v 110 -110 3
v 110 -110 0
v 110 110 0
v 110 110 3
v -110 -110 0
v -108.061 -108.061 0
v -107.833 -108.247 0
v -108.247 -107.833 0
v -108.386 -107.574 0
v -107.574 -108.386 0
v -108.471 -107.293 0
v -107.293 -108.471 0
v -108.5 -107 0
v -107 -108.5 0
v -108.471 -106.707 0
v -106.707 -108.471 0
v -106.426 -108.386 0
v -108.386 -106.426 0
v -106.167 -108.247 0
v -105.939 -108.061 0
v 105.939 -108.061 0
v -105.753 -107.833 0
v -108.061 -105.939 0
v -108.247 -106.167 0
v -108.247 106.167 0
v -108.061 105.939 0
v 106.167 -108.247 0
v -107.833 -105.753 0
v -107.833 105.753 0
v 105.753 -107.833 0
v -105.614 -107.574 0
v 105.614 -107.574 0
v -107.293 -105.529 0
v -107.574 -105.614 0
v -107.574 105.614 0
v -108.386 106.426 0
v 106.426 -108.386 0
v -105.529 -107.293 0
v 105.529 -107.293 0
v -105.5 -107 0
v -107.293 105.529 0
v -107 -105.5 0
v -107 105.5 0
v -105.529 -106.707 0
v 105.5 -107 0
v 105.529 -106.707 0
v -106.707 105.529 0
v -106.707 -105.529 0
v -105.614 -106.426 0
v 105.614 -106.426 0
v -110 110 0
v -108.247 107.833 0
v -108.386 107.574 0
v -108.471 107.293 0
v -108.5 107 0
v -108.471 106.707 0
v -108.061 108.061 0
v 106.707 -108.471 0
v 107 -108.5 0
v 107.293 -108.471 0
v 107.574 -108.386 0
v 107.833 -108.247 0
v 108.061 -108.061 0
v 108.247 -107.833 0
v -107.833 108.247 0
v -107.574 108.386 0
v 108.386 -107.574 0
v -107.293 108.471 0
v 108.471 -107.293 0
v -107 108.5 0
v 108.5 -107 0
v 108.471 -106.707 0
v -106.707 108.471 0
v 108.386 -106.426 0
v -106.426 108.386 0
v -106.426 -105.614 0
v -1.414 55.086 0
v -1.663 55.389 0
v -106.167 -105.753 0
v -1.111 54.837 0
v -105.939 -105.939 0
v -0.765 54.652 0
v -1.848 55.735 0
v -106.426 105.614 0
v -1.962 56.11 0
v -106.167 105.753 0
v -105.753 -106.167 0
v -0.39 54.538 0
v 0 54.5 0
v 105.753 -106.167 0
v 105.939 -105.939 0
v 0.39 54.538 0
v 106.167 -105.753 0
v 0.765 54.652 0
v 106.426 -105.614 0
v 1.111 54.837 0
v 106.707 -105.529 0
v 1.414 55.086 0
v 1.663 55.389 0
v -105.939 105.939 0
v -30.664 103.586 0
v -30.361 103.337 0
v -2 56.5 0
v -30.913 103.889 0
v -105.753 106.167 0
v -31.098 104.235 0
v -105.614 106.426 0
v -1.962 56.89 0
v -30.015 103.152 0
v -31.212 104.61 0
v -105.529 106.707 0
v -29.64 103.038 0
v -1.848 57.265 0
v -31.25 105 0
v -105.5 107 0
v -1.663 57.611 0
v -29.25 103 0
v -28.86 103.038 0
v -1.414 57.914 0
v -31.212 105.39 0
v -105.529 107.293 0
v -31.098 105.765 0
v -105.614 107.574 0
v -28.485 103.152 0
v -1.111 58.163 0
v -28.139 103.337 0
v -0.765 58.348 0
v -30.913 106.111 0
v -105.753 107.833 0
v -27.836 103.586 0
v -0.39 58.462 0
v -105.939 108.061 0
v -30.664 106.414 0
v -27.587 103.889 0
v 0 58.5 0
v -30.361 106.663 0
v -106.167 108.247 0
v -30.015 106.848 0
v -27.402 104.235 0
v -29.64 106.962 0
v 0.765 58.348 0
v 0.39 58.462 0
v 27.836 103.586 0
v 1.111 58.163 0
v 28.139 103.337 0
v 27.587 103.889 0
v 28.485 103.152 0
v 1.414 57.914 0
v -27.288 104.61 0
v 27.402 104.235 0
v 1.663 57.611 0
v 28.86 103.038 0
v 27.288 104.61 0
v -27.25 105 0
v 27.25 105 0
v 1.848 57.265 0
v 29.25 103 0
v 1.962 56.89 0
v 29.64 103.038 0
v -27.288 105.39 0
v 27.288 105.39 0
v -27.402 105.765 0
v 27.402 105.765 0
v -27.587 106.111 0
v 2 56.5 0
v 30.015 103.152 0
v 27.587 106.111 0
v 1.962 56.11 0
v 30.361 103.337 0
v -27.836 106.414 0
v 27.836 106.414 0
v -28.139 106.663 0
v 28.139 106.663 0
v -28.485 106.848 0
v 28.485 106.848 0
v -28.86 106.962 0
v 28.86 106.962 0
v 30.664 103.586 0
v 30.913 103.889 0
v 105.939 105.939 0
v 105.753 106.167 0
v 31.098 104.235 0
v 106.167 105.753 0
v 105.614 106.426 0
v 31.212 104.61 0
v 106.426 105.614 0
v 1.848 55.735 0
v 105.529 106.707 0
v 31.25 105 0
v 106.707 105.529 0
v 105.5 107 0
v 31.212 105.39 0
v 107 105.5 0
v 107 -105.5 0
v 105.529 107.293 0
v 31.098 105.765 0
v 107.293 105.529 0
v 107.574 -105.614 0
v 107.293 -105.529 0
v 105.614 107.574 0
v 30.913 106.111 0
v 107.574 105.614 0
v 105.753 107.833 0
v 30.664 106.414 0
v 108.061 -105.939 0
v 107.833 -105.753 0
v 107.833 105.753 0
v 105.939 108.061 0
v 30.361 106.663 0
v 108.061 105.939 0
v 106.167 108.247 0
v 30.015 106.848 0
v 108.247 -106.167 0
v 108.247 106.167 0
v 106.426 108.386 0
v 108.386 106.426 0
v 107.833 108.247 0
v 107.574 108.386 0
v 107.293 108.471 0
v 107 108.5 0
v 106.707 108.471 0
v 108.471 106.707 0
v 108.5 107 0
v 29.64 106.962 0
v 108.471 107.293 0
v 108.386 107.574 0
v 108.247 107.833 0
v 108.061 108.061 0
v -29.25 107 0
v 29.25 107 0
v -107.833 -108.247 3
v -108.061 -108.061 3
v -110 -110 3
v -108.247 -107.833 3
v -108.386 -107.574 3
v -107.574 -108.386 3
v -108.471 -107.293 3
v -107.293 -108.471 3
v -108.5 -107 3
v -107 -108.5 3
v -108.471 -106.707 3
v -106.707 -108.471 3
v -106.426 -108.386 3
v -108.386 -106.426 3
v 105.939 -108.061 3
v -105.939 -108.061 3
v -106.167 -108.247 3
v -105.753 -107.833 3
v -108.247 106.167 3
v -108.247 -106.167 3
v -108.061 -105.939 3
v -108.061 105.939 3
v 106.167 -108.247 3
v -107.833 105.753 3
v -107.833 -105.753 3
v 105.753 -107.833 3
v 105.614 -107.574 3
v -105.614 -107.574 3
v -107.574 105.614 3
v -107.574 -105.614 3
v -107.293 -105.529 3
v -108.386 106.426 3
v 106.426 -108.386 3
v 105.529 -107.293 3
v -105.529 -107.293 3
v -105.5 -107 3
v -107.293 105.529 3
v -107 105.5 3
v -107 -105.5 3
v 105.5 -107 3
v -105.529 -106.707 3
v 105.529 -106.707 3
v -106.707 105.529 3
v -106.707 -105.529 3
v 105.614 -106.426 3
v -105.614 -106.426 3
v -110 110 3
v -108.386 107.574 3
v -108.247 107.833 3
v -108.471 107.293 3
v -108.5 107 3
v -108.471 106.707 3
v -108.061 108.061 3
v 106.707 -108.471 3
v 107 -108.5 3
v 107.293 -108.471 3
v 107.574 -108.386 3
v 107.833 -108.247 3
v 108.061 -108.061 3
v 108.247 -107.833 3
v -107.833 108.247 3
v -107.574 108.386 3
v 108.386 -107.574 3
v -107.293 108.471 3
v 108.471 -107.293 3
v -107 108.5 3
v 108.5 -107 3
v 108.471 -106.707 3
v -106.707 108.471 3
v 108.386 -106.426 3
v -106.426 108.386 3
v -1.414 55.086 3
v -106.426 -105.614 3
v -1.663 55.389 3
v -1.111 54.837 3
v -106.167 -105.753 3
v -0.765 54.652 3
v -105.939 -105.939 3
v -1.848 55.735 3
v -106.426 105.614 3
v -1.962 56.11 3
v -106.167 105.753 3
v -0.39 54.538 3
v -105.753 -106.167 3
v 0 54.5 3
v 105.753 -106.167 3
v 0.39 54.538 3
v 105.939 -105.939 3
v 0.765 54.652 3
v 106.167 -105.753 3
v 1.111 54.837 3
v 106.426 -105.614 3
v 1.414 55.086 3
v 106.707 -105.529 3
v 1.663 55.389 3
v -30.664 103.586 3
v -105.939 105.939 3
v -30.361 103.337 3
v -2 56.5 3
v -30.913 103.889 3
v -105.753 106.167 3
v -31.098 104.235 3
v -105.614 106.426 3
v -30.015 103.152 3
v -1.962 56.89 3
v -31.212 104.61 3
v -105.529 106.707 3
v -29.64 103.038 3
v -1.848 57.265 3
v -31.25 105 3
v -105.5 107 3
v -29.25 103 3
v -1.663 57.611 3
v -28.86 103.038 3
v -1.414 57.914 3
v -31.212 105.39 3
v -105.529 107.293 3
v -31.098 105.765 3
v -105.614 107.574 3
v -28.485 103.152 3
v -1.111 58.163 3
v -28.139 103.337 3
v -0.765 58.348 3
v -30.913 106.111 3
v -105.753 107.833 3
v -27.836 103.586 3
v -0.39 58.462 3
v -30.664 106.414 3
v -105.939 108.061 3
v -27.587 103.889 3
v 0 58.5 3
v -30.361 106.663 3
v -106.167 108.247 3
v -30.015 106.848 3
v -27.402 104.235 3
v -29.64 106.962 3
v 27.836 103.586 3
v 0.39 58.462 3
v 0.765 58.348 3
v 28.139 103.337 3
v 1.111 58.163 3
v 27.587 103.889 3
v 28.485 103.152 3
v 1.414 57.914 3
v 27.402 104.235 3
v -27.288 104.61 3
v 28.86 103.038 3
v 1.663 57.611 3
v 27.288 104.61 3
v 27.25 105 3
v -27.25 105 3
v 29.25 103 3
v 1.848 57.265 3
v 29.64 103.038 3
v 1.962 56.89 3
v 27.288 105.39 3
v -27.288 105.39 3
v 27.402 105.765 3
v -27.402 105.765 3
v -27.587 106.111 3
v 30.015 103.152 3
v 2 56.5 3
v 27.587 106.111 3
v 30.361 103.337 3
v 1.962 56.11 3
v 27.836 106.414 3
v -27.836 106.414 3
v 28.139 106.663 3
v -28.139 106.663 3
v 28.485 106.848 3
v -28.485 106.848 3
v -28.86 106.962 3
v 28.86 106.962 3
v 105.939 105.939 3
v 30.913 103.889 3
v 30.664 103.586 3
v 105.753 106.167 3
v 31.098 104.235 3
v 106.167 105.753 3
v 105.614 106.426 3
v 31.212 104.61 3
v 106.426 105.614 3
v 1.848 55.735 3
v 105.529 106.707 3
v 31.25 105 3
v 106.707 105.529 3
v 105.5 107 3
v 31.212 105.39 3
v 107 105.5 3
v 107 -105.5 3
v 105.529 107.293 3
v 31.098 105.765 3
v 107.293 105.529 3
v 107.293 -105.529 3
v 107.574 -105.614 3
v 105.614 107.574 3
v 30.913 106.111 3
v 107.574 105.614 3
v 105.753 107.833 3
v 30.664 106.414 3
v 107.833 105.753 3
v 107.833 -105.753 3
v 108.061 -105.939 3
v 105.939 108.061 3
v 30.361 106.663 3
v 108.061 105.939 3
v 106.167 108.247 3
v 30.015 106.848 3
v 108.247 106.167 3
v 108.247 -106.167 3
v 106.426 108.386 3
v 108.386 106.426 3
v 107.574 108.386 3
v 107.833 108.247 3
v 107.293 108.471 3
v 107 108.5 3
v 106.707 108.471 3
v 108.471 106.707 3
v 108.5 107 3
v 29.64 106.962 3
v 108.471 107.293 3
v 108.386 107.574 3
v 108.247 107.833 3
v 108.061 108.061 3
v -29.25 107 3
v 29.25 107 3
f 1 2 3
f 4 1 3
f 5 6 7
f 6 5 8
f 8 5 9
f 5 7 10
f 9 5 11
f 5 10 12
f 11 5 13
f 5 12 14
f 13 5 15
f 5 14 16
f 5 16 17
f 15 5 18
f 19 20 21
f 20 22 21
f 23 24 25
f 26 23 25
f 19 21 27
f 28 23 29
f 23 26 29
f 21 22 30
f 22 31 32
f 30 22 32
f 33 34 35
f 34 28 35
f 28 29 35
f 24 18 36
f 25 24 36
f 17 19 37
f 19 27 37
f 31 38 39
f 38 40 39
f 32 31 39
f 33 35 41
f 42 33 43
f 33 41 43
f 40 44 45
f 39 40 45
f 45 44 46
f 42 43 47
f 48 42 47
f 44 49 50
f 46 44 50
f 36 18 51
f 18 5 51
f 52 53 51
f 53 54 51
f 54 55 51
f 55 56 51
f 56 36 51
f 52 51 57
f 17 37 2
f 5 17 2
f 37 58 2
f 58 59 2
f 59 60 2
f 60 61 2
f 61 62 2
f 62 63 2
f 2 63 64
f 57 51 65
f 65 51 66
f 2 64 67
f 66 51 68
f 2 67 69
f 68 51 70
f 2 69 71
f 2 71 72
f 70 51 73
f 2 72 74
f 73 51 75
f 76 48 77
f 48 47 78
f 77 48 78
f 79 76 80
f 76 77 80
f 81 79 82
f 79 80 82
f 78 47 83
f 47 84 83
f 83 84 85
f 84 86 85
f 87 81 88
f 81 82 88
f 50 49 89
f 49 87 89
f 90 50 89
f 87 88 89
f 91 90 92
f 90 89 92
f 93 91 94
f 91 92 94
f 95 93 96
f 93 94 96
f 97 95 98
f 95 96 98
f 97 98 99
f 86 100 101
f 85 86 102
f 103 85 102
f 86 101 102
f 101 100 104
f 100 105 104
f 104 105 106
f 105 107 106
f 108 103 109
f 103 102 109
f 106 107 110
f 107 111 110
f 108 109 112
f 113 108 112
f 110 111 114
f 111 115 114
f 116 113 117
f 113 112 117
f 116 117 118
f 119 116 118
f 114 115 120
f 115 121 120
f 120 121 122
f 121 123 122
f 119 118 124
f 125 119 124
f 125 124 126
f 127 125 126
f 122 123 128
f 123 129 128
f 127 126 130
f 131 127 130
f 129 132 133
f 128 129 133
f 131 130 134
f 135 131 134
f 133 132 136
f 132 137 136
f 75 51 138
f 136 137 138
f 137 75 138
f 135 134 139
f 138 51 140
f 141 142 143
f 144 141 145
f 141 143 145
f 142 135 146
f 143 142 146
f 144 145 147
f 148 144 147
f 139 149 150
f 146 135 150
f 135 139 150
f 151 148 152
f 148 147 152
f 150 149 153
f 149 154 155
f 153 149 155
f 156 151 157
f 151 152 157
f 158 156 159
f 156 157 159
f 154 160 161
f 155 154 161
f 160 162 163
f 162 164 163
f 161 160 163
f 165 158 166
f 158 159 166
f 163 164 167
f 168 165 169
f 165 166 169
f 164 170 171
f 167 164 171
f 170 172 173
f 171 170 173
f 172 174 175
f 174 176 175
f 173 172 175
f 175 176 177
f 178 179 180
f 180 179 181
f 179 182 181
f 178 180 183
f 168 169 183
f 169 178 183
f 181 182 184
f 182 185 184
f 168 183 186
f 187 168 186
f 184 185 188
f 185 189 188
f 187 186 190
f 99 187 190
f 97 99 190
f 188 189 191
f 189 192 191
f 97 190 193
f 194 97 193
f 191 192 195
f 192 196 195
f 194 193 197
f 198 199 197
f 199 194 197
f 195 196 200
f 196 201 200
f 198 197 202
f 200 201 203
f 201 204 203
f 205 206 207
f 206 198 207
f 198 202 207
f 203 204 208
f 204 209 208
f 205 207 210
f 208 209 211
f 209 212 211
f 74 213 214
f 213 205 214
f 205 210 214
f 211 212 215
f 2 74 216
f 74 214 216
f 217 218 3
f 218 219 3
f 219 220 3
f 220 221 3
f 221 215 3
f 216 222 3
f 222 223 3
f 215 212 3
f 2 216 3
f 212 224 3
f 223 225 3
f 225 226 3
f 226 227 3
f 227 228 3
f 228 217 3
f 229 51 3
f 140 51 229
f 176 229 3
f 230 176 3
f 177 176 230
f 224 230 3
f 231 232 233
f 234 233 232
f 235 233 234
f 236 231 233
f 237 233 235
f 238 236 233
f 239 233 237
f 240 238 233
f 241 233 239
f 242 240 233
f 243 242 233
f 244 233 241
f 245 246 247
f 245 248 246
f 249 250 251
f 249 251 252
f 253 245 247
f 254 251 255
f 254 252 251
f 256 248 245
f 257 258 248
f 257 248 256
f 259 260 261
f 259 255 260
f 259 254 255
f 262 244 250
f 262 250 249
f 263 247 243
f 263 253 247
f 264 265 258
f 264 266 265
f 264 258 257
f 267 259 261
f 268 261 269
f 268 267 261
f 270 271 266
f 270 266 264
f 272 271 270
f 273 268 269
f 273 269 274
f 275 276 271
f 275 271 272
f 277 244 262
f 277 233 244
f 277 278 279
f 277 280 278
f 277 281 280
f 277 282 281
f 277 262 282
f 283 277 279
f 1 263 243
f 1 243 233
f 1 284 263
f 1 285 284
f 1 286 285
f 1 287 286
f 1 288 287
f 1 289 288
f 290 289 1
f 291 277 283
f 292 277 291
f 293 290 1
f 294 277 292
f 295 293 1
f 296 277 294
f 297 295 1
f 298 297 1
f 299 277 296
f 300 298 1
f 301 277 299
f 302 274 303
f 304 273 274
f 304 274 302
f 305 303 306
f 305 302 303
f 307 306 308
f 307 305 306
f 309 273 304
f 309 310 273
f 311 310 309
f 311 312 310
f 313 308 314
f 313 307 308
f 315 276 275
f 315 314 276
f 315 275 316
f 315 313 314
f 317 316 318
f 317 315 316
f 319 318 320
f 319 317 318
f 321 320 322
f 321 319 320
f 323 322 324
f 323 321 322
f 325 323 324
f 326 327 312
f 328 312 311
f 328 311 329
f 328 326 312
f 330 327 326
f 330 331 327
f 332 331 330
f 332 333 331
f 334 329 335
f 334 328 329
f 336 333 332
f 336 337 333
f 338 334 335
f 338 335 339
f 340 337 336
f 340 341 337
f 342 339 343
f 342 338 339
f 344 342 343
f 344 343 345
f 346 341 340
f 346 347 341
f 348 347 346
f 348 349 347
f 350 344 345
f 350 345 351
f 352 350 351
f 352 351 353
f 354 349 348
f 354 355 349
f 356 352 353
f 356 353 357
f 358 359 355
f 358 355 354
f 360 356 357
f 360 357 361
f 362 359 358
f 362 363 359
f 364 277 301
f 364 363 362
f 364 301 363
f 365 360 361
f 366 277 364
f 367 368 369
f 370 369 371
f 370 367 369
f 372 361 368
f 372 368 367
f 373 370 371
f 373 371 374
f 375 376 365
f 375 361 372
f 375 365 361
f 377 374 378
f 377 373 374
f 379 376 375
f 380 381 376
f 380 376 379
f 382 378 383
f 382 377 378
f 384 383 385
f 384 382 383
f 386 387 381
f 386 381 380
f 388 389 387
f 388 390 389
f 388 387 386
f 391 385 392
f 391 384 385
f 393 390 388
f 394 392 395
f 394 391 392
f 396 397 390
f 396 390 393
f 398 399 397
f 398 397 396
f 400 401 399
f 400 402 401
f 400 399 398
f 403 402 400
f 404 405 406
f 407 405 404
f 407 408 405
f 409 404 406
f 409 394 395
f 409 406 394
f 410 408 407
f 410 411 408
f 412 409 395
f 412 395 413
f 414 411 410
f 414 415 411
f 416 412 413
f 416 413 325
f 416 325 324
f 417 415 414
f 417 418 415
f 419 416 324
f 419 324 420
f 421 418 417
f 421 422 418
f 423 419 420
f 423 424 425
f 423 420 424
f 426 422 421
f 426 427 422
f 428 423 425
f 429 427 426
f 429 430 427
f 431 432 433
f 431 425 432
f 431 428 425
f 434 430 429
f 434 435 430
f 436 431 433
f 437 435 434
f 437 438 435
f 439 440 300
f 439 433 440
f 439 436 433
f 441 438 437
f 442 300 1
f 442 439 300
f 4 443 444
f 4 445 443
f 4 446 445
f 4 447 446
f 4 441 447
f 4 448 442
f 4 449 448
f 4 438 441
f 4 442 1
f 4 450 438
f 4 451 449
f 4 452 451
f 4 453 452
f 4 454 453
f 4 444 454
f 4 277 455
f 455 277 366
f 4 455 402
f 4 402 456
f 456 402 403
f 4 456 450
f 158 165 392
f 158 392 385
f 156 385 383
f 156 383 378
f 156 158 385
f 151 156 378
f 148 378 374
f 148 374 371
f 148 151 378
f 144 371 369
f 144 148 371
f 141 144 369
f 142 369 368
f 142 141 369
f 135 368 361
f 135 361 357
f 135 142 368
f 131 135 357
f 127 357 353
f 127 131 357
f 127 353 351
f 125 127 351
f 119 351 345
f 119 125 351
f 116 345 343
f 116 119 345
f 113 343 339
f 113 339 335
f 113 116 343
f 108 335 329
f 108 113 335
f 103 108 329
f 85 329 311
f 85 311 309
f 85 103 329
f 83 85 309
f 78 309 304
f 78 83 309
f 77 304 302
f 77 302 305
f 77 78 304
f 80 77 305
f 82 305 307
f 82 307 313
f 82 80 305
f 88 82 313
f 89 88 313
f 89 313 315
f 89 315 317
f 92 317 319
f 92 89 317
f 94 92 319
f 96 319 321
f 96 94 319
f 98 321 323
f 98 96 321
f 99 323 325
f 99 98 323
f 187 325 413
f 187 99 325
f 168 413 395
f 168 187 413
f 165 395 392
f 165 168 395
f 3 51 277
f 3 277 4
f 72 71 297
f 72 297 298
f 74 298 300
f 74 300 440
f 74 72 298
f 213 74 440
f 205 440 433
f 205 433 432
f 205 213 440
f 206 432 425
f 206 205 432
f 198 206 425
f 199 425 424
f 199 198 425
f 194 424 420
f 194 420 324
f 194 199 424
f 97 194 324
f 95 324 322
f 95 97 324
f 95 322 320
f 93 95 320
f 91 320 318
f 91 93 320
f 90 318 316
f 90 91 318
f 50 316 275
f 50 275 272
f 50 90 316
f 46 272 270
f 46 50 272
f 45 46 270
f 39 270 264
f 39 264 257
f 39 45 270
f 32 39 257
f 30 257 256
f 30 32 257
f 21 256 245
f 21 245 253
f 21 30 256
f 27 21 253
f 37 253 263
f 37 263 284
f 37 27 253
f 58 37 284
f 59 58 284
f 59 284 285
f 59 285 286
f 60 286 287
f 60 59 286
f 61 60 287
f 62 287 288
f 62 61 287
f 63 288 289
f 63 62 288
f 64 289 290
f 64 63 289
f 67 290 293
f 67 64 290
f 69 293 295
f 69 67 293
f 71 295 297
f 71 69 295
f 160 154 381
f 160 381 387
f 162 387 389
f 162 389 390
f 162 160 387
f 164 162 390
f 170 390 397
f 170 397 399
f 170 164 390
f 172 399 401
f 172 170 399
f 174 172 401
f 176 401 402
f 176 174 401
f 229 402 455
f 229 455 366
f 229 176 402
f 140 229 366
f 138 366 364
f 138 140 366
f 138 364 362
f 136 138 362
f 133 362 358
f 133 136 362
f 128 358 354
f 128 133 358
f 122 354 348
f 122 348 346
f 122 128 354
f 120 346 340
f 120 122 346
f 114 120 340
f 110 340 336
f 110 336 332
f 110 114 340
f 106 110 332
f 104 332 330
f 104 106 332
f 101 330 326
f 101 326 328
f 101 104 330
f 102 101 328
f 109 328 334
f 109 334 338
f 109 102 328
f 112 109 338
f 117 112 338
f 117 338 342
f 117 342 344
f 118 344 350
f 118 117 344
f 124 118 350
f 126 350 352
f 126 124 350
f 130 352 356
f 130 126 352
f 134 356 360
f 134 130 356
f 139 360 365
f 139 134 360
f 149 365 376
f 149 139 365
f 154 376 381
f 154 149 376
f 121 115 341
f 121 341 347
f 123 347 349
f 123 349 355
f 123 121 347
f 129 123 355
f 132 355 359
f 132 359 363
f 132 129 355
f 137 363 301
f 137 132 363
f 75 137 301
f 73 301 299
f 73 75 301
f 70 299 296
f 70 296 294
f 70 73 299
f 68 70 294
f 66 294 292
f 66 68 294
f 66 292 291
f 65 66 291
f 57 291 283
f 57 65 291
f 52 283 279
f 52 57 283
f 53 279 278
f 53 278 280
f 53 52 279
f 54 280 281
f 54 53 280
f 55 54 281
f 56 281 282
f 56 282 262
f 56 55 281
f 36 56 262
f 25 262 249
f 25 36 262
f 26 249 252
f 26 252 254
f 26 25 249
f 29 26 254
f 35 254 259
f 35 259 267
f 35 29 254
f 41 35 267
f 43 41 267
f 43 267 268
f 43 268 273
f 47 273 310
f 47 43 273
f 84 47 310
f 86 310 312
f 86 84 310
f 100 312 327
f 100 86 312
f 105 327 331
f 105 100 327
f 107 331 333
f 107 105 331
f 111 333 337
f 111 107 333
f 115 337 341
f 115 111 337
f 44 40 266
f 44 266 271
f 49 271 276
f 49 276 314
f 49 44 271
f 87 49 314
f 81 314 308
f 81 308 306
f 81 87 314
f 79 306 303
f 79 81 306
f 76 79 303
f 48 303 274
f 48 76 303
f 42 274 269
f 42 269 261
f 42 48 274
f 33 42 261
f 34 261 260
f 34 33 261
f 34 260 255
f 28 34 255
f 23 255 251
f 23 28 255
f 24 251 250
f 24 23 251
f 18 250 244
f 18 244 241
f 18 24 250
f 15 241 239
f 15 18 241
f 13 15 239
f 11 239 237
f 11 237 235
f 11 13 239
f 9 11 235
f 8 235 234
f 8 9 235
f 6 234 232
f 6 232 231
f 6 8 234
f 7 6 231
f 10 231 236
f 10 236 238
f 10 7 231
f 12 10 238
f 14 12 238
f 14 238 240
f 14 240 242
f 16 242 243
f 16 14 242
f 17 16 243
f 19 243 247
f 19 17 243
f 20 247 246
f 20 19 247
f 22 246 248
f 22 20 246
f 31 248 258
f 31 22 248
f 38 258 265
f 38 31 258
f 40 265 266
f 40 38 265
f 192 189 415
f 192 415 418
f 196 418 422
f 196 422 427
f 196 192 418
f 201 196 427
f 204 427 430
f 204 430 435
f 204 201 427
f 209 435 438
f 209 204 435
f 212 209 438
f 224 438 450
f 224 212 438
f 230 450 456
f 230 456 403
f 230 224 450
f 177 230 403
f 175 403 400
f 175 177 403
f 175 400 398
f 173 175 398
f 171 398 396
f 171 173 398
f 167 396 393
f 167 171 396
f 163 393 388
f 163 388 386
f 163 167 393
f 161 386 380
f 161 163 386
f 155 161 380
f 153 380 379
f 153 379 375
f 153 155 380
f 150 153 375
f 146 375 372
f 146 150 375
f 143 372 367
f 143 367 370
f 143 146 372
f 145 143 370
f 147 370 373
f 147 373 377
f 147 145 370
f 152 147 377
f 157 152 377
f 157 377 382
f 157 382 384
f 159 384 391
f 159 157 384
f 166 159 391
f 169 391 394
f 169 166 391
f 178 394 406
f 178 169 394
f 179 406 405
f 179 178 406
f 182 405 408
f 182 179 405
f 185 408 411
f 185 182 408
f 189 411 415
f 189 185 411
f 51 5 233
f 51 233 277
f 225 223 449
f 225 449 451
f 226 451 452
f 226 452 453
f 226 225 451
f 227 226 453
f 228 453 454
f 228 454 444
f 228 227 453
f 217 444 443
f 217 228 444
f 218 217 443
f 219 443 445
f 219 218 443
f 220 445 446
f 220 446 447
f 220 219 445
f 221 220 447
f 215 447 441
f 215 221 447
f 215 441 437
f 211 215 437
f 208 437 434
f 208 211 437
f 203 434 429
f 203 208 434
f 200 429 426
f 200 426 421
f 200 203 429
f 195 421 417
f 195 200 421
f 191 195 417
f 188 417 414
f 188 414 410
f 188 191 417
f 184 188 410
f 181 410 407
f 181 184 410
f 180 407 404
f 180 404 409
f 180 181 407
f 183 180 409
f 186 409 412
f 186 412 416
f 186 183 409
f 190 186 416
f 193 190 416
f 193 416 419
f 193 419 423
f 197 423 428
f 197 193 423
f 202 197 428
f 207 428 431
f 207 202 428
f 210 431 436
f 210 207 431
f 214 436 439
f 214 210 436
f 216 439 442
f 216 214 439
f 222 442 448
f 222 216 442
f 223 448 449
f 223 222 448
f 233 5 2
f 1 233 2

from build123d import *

# Parameters (mm, degrees)
SKETCH_W   = 220
SKETCH_H   = 220
SKETCH_R   = 1.5
SKETCH_R_2 = 2
PAD_DEPTH  = 3


with BuildPart() as part:
    # Sketch → Pad (new body)
    with BuildSketch(Plane.XY):
        Rectangle(SKETCH_W, SKETCH_H)
        with Locations((-107, 107)):
            Circle(SKETCH_R, mode=Mode.SUBTRACT)
        with Locations((107, 107)):
            Circle(SKETCH_R, mode=Mode.SUBTRACT)
        with Locations((107, -107)):
            Circle(SKETCH_R, mode=Mode.SUBTRACT)
        with Locations((-107, -107)):
            Circle(SKETCH_R, mode=Mode.SUBTRACT)
        with Locations((-29.25, 105)):
            Circle(SKETCH_R_2, mode=Mode.SUBTRACT)
        with Locations((29.25, 105)):
            Circle(SKETCH_R_2, mode=Mode.SUBTRACT)
        with Locations((0, 56.5)):
            Circle(SKETCH_R_2, mode=Mode.SUBTRACT)
    extrude(amount=PAD_DEPTH)


solid = part.part
